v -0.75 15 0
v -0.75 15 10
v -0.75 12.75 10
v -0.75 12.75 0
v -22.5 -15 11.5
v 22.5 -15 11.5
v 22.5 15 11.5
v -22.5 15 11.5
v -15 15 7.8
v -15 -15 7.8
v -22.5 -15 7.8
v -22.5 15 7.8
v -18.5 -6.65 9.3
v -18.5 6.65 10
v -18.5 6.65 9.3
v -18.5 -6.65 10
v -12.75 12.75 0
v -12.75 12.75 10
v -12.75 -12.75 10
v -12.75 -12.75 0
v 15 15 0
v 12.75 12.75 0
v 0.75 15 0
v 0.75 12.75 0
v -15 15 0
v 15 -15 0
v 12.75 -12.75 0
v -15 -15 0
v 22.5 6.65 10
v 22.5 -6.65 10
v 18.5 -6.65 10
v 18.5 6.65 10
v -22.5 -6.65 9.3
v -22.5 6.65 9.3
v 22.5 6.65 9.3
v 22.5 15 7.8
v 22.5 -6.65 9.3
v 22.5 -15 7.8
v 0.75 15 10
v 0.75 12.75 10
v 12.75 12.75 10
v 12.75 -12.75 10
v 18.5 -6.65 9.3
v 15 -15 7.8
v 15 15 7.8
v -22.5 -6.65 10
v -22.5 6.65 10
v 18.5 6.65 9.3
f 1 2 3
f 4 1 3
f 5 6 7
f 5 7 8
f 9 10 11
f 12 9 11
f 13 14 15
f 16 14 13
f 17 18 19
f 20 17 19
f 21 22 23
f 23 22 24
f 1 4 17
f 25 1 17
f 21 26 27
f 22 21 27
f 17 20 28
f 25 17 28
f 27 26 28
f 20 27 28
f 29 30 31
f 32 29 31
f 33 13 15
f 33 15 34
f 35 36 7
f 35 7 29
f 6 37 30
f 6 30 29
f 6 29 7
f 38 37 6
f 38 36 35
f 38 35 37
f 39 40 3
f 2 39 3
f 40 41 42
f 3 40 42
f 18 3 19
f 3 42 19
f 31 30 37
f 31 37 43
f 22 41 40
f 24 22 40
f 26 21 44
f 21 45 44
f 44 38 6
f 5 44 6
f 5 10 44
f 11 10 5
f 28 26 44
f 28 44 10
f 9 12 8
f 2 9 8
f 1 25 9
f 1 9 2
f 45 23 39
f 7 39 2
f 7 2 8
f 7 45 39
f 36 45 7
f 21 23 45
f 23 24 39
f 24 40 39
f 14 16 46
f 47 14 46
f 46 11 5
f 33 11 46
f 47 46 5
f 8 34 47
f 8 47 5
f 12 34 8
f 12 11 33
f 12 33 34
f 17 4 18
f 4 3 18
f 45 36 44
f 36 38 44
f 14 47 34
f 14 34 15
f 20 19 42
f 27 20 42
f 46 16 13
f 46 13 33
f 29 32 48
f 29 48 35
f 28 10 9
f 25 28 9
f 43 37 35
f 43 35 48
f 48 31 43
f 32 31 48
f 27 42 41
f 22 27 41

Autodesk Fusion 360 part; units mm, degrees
sketch "Sketch1" plane through (0, 0, 0) normal (0, 0, 1) x (1, 0, 0)
  line L0 (12.75, -12.75) -> (-12.75, -12.75)
  line L1 (-12.75, -12.75) -> (-12.75, 12.75)
  line L2 (-12.75, 12.75) -> (12.75, 12.75)
  line L3 (12.75, 12.75) -> (12.75, -12.75)
  line L4 (12.75, -12.75) -> (-12.75, 12.75) construction
  line L5 (-12.75, -12.75) -> (12.75, 12.75) construction
  line L6 (-0.75, 12.75) -> (0.75, 12.75)
  line L7 (0.75, 12.75) -> (0.75, 42.75)
  line L8 (0.75, 42.75) -> (-0.75, 42.75)
  line L9 (-0.75, 42.75) -> (-0.75, 12.75)
  dimension "d1" = 25.5
  dimension "d2" = 25.5
  dimension "d3" = 1.5
  dimension "d4" = 30
  dimension "d5" = 0.75
extrude "Extrude1" add sketch "Sketch1" along normal blind 10 makes body 1
sketch "Sketch2" plane through (0, 0, 10) normal (0, 0, 1) x (-1, 0, 0)
  line L0 (-0.75, -12.75) -> (-0.75, -42.75)
  line L1 (-0.75, -42.75) -> (0.75, -42.75)
  line L2 (0.75, -42.75) -> (0.75, -12.75)
  line L3 (0.75, -12.75) -> (12.75, -12.75)
  line L4 (12.75, -12.75) -> (12.75, 12.75)
  line L5 (12.75, 12.75) -> (-12.75, 12.75)
  line L6 (-12.75, 12.75) -> (-12.75, -12.75)
  line L7 (-12.75, -12.75) -> (-0.75, -12.75)
  line L8 (-15, 15) -> (15, 15)
  line L9 (15, 15) -> (15, -15)
  line L10 (15, -15) -> (-15, -15)
  line L11 (-15, -15) -> (-15, 15)
  line L12 (-15, 15) -> (15, -15) construction
  line L13 (15, 15) -> (-15, -15) construction
  line L14 (-22.5, 15) -> (22.5, 15)
  line L15 (22.5, 15) -> (22.5, -15)
  line L16 (22.5, -15) -> (-22.5, -15)
  line L17 (-22.5, -15) -> (-22.5, 15)
  line L18 (-22.5, 15) -> (22.5, -15) construction
  line L19 (22.5, 15) -> (-22.5, -15) construction
  line L20 (-26.5, 6.65) -> (-18.5, 6.65)
  line L21 (-18.5, 6.65) -> (-18.5, -6.65)
  line L22 (-18.5, -6.65) -> (-26.5, -6.65)
  line L23 (-26.5, -6.65) -> (-26.5, 6.65)
  line L24 (-26.5, 6.65) -> (-18.5, -6.65) construction
  line L25 (-18.5, 6.65) -> (-26.5, -6.65) construction
  line L26 (18.5, 6.65) -> (26.5, 6.65)
  line L27 (26.5, 6.65) -> (26.5, -6.65)
  line L28 (26.5, -6.65) -> (18.5, -6.65)
  line L29 (18.5, -6.65) -> (18.5, 6.65)
  line L30 (18.5, 6.65) -> (26.5, -6.65) construction
  line L31 (26.5, 6.65) -> (18.5, -6.65) construction
  point P0 (-22.5, 0)
  point P1 (22.5, 0)
  dimension "d8" = 30
  dimension "d9" = 30
  dimension "d10" = 45
  dimension "d11" = 30
  dimension "d12" = 8
  dimension "d13" = 13.3
  dimension "d14" = 8
  dimension "d15" = 13.3
extrude "Extrude2" add sketch "Sketch2" against normal blind 10 separate body contours L0 L2 L3 L4 L5 L6 L7 L8 L9 L10 L11 L14 L16 makes body 2
extrude "Extrude3" add sketch "Sketch2" along normal blind 1.5 contours L0 L2 L3 L4 L5 L6 L7 L10 L16 | L0 L2 L3 L4 L5 L6 L7 L8 L9 L10 L11 L14 L16 | L11 L14 L16 L17 L20 L21 L22 | L9 L14 L15 L16 L26 L28 L29 | L17 L20 L21 L22 | L15 L26 L28 L29 bodies 2
extrude "Extrude4" add sketch "Sketch2" against normal blind 0.7 contours L11 L14 L16 L17 L20 L21 L22 | L9 L14 L15 L16 L26 L28 L29 bodies 2
extrude "Extrude5" add sketch "Sketch2" against normal blind 1.5 from surface at -0.7 contours L11 L14 L16 L17 L20 L21 L22 | L9 L14 L15 L16 L26 L28 L29 | L17 L20 L21 L22 | L15 L26 L28 L29 bodies 2
hidden bodies 1
